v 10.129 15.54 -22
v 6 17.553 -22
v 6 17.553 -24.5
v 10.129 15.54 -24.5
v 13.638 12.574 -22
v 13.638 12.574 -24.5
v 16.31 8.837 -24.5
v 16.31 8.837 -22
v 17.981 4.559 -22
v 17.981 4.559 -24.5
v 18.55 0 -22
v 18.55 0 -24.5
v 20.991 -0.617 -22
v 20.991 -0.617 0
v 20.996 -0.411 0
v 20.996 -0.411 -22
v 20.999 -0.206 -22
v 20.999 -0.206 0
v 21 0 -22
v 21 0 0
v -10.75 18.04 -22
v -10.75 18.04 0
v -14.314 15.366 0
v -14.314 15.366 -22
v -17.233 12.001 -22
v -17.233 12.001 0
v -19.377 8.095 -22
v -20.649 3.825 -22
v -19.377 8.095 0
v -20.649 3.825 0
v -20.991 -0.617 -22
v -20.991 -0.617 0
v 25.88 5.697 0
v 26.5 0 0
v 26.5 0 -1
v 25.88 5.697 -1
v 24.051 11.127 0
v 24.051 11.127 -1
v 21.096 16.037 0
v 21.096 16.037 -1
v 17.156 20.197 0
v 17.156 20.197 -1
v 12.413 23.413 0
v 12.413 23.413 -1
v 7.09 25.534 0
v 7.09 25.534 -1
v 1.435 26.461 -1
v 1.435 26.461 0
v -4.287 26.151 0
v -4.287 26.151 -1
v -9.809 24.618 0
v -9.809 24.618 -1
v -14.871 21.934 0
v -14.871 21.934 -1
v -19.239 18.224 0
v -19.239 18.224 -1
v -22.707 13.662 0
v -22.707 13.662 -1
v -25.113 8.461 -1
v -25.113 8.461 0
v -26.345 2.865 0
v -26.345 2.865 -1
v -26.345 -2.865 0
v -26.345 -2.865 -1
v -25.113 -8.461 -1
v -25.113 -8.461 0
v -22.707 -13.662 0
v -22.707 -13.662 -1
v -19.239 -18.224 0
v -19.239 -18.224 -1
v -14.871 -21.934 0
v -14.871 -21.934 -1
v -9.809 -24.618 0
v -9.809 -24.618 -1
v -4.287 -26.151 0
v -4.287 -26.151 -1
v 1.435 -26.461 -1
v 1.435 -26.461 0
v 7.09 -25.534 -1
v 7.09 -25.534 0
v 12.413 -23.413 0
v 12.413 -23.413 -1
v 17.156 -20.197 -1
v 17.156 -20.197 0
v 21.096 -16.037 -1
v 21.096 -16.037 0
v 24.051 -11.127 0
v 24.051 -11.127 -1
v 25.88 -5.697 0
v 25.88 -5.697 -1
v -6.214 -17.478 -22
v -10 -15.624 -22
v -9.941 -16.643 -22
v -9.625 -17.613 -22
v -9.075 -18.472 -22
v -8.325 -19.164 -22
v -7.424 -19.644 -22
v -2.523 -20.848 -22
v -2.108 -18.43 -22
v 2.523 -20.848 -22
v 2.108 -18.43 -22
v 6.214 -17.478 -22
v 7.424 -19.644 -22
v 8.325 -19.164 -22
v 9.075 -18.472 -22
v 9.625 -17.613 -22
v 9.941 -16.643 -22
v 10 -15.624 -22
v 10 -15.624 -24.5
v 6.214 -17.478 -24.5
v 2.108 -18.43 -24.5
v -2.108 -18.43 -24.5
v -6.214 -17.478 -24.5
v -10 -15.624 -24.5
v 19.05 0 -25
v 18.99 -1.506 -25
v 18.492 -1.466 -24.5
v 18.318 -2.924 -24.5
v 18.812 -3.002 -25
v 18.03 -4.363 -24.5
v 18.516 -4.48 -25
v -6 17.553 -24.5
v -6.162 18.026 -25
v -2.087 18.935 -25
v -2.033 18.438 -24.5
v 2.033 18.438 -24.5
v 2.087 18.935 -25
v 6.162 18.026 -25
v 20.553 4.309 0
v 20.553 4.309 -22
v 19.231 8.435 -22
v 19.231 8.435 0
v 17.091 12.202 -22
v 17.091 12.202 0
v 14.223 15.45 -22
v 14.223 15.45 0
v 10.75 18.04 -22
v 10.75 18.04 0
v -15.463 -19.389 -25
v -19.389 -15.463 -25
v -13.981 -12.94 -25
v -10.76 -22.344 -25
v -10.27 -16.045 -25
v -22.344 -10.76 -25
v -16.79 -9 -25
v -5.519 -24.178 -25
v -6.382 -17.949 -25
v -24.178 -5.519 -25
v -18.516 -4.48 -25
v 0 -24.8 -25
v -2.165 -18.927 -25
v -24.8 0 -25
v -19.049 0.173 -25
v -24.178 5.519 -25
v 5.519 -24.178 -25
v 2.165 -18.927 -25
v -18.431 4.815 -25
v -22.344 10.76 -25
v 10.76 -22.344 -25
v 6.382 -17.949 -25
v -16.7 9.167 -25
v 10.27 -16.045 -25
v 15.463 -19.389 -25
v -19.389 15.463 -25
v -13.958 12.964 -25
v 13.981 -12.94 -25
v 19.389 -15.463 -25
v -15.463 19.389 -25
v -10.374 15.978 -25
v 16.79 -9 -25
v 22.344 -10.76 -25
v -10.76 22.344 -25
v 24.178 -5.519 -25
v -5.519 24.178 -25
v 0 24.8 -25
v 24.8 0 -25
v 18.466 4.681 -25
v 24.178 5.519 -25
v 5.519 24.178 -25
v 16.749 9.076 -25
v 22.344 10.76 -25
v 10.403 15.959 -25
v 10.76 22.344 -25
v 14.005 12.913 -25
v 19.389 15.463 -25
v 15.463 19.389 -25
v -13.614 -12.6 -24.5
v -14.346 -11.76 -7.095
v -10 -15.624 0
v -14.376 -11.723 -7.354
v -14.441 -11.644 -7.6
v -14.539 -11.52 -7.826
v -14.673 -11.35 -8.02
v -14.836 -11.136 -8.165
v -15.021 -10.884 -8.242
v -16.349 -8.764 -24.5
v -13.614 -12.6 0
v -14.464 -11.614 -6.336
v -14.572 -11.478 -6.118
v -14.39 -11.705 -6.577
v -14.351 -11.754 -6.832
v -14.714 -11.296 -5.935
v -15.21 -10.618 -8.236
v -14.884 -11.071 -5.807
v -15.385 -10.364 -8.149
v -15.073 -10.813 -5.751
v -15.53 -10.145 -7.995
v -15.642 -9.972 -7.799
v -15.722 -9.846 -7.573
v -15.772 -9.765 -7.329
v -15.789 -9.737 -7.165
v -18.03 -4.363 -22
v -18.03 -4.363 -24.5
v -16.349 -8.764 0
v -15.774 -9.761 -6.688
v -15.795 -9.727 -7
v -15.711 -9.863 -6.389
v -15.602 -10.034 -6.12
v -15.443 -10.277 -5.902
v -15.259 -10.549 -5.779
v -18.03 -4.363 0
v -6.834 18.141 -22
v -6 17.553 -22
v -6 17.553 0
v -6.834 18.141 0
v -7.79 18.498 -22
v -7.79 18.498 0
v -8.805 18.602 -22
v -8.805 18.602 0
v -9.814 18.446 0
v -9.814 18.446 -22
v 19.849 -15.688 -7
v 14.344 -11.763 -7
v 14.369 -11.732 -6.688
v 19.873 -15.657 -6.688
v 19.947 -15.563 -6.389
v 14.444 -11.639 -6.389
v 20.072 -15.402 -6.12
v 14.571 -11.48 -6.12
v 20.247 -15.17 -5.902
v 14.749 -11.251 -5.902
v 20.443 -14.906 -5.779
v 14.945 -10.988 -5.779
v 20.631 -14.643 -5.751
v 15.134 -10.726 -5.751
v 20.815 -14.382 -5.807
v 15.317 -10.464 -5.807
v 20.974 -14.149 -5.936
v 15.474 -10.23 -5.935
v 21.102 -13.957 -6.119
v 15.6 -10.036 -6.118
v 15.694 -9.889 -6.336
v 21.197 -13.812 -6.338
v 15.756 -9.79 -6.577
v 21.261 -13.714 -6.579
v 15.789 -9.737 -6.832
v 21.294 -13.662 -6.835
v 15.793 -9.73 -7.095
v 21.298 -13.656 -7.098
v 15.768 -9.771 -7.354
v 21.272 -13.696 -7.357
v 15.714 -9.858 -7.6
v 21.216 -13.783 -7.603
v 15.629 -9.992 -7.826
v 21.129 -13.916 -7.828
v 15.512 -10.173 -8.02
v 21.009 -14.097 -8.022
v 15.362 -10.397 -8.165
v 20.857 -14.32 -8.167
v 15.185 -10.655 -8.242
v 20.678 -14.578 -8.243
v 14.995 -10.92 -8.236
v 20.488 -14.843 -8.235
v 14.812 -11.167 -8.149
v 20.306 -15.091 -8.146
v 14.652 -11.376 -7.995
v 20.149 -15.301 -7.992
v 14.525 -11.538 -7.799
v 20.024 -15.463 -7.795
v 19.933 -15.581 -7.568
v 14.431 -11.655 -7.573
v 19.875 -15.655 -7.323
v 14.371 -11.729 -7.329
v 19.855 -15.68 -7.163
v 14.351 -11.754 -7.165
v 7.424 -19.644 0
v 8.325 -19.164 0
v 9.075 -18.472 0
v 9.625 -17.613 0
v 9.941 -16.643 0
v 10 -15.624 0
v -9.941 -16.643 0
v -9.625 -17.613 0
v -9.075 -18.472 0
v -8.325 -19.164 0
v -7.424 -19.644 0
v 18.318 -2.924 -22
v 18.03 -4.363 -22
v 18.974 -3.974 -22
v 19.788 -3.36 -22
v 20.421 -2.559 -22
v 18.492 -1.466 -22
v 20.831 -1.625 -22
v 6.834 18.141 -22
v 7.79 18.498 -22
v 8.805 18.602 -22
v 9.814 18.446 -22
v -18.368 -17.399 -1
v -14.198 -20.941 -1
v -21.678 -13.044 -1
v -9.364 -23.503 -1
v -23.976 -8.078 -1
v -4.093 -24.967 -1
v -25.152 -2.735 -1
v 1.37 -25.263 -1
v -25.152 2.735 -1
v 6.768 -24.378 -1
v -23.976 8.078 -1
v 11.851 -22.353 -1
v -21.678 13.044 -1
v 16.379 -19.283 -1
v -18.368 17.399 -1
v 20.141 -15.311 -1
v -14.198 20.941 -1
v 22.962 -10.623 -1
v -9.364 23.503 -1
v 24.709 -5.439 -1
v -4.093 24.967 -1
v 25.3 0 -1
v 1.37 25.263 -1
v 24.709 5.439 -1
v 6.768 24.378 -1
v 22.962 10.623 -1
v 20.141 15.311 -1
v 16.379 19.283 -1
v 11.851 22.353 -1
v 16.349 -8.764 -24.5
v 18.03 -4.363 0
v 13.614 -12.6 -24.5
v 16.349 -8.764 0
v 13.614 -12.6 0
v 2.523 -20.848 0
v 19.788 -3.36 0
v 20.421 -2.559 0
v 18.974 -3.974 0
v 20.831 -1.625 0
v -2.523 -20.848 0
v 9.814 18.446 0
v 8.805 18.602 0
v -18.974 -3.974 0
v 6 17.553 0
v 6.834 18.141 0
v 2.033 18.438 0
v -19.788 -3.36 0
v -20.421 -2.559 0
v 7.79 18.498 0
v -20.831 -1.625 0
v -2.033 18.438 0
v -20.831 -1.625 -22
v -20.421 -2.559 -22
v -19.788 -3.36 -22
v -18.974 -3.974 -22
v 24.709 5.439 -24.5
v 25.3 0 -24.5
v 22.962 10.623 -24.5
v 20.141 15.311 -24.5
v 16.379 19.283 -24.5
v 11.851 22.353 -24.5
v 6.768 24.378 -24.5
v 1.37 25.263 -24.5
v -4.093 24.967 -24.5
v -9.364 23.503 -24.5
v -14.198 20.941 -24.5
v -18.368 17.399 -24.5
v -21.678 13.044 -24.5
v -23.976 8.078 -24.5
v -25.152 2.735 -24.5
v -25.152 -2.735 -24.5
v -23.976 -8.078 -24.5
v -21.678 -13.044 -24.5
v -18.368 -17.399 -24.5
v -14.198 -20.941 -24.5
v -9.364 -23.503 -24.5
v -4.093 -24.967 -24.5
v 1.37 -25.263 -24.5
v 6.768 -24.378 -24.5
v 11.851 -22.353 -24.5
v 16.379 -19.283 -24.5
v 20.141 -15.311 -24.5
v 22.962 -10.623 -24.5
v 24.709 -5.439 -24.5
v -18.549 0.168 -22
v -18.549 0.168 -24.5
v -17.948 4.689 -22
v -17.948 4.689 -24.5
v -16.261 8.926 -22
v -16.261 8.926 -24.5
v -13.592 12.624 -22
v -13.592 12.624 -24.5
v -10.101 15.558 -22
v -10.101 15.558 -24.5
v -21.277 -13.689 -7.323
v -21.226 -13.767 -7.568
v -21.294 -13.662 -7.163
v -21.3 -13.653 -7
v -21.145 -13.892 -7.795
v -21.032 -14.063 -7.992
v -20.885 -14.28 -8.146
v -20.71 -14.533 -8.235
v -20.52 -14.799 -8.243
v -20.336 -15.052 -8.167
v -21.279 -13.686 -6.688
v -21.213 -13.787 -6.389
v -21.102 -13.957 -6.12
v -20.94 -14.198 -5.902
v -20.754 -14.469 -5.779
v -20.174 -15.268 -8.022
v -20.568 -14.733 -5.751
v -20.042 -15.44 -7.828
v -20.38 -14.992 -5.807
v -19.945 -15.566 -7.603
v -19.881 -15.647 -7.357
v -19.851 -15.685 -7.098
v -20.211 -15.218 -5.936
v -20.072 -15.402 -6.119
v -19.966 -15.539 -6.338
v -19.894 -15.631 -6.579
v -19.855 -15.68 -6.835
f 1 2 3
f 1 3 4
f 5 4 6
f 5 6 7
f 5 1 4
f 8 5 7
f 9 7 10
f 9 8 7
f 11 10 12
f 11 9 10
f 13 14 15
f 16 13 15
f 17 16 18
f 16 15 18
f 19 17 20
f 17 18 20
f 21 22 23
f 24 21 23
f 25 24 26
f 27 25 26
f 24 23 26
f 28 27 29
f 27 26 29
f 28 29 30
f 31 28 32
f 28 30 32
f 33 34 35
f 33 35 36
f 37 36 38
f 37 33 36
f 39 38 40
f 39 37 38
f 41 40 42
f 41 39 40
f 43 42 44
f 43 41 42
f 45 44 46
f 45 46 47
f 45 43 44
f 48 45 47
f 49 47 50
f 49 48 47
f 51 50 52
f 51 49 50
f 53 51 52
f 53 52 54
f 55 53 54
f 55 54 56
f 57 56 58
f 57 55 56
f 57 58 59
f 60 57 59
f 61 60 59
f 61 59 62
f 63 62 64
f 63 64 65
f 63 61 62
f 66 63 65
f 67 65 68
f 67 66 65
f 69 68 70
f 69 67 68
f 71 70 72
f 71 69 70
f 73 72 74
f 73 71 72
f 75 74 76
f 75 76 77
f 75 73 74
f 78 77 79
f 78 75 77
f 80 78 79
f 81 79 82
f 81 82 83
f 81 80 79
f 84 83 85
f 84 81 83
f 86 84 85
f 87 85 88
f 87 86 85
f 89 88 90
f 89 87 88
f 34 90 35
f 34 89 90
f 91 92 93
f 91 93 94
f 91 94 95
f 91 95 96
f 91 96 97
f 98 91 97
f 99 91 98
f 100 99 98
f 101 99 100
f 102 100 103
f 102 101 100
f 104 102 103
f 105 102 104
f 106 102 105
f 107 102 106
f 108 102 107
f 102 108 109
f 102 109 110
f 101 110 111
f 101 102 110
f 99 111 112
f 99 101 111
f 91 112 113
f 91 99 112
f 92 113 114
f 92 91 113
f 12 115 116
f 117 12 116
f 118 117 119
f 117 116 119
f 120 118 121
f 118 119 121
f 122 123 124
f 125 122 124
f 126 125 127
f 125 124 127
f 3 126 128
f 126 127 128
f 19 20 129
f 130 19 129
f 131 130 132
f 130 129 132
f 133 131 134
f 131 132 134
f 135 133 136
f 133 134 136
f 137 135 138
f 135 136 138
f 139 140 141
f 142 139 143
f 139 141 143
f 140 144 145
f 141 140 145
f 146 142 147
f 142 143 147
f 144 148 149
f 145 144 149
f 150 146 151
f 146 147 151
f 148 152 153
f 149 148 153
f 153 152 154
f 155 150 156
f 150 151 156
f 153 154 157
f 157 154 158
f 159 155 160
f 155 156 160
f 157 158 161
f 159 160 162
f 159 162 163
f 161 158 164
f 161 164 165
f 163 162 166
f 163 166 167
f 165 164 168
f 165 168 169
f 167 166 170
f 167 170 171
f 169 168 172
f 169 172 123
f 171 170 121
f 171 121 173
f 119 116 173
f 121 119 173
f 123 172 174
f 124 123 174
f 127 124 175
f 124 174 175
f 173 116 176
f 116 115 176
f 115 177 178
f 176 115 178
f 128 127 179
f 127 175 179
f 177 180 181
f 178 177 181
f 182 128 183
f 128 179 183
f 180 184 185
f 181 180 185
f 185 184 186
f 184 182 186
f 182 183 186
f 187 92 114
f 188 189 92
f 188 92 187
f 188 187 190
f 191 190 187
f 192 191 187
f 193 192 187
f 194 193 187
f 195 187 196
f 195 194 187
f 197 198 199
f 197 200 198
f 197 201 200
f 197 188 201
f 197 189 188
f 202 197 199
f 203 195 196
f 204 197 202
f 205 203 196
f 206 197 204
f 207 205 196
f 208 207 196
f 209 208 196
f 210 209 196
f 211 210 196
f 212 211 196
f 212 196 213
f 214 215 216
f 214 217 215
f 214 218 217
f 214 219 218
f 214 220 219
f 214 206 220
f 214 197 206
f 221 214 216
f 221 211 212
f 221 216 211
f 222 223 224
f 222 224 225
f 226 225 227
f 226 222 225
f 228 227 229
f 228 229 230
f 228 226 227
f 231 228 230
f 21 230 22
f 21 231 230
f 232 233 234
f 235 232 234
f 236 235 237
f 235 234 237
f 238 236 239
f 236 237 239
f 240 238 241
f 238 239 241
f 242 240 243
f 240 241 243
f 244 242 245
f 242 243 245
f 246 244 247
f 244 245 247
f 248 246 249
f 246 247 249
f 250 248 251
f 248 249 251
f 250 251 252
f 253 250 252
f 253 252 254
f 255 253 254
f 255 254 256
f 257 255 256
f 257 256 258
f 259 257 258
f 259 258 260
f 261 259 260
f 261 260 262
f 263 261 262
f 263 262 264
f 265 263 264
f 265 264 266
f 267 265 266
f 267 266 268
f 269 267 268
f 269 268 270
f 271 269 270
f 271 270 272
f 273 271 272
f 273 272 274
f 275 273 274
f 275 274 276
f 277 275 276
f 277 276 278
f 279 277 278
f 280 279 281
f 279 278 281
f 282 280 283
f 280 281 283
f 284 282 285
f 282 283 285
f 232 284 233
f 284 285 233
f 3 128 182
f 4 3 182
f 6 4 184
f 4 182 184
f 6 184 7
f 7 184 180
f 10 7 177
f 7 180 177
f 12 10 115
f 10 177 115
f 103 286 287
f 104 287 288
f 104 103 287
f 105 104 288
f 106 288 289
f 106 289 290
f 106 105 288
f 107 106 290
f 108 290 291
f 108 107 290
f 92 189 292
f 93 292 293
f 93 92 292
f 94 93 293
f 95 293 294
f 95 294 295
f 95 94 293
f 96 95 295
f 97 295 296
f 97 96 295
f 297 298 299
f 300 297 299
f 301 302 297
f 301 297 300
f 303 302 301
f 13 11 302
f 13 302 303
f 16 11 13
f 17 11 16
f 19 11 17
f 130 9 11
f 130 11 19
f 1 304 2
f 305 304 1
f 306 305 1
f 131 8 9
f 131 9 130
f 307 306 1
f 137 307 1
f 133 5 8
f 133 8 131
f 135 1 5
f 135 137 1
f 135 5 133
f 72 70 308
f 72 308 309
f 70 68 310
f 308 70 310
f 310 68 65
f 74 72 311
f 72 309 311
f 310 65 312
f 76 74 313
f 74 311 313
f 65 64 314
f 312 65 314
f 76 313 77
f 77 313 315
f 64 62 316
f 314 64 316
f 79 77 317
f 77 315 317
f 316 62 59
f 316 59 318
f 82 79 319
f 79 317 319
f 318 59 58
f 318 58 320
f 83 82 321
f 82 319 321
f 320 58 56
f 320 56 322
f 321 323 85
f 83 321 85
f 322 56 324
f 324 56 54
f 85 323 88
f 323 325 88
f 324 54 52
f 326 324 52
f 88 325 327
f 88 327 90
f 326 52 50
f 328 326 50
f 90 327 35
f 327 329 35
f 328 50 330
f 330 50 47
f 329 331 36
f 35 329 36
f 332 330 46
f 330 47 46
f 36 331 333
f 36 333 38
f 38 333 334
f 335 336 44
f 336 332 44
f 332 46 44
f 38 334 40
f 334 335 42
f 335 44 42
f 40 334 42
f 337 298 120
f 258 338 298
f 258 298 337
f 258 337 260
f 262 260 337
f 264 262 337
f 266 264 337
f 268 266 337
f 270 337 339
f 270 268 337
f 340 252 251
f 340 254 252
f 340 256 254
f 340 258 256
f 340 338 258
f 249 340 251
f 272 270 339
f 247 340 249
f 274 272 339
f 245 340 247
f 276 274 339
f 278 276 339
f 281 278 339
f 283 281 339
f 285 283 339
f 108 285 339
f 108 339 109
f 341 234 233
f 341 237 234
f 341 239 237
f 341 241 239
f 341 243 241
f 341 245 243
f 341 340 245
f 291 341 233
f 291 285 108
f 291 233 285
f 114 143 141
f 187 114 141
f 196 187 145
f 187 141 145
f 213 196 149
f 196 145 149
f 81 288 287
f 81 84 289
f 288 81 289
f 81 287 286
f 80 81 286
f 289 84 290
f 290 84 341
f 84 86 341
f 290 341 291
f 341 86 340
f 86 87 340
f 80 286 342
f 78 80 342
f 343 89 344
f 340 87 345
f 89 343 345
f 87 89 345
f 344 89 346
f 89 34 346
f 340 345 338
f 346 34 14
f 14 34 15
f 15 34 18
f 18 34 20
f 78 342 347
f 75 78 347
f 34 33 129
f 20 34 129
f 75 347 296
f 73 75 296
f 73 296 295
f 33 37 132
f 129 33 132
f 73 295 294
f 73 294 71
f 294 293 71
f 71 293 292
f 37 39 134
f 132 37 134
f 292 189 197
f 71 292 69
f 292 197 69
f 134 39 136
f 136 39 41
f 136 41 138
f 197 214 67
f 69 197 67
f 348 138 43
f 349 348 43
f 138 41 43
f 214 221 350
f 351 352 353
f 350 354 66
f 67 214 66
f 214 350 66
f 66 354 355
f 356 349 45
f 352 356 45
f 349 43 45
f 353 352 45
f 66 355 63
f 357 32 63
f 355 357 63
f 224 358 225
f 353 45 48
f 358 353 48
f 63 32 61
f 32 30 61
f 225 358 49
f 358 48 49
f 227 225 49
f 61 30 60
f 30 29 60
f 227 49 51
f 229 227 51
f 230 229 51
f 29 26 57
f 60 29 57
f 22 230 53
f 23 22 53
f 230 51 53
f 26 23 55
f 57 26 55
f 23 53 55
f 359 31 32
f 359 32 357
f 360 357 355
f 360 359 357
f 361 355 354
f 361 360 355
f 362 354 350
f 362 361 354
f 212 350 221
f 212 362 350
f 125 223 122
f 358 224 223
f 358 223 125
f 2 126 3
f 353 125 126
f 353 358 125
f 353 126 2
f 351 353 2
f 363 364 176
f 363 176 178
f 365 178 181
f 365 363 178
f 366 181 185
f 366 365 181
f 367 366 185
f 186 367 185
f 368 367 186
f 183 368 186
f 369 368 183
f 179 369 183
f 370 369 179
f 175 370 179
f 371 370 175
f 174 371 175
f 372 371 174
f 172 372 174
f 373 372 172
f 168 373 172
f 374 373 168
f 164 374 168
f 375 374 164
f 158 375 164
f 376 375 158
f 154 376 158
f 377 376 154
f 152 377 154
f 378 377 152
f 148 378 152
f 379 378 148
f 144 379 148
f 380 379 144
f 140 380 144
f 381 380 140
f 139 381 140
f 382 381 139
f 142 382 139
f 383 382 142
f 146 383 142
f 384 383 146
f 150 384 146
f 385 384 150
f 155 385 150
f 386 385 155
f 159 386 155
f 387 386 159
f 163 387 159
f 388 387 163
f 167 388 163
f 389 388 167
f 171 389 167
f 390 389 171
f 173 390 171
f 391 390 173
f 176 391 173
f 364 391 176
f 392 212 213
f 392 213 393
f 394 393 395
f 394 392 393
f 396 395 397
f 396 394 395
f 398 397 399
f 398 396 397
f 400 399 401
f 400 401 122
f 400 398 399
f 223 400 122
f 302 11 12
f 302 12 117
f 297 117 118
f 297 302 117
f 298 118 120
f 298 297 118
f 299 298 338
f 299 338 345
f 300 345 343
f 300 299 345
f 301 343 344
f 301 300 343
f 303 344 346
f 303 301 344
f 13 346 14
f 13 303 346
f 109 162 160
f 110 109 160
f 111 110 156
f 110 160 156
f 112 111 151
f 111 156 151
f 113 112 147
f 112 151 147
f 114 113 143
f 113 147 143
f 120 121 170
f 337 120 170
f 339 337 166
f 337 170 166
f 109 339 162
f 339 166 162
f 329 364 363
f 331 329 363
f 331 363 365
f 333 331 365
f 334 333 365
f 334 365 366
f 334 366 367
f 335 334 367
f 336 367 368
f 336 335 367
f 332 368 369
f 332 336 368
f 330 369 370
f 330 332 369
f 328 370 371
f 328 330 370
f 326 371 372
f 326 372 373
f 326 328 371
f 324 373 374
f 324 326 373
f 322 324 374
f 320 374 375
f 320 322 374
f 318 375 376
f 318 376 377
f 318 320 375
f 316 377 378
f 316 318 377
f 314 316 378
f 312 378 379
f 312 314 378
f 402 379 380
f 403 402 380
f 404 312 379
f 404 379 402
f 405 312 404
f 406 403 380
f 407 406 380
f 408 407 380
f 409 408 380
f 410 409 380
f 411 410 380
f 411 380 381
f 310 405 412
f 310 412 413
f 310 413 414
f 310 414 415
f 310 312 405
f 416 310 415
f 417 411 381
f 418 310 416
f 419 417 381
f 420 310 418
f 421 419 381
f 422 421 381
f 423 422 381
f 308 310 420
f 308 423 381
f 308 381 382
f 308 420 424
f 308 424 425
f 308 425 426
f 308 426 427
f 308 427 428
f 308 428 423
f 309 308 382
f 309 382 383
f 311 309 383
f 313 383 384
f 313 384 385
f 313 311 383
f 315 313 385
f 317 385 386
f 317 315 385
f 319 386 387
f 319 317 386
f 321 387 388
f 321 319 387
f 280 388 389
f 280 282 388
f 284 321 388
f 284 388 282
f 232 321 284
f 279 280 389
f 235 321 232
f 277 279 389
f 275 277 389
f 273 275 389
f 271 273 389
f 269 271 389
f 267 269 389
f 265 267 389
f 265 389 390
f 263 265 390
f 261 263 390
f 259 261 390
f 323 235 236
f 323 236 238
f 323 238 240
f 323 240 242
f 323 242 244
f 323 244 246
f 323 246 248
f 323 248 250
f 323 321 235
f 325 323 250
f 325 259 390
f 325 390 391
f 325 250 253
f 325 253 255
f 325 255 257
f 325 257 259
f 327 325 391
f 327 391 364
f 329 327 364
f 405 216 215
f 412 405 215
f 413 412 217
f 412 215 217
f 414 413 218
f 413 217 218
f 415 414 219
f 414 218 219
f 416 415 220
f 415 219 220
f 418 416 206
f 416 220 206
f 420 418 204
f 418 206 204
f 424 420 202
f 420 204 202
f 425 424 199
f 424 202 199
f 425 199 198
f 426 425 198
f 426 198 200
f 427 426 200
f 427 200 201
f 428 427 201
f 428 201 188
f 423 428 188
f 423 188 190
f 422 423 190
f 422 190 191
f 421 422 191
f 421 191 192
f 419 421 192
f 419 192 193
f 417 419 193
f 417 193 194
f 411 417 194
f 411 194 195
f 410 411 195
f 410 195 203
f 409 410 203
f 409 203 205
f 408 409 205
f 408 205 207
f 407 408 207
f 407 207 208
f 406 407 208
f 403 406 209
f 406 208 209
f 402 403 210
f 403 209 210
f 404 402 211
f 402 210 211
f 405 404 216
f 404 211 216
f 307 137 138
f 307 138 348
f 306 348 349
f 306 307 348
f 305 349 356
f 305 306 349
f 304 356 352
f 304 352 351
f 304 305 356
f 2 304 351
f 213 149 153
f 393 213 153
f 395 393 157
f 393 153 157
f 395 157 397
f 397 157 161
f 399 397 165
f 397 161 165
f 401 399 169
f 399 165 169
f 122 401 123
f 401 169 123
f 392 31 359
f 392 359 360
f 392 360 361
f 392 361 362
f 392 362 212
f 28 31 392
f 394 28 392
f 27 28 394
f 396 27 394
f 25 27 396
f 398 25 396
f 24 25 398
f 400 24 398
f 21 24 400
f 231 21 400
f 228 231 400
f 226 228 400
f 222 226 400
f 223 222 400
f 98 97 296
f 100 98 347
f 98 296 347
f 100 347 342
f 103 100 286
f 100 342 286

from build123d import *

# Parameters (mm, degrees)
F0_R           = 26.5
F0_R_2         = 25.3
F1_DEPTH       = 1
F2_DEPTH       = 25
F3_DEPTH       = 22
F4_T1_DEPTH    = 22
F9_D           = 2.5
F9_DEPTH       = 25
F9_START       = 1.2308984
F9_TIP         = 0.7510757738
F9_ON_F7_D     = 2.5
F9_ON_F7_DEPTH = 25
F9_ON_F7_START = 1.2308984
F9_ON_F7_TIP   = 0.7510757738
F10_SIZE       = 0.5


# Not quite as in the source:
# - a fillet or chamfer that OpenCascade refuses, or shapes differently, is made with other operations: its cross-section is extruded or revolved along the edge and cut away or added


with BuildPart() as f1:
    # F0 (on Top) → F1 (new body)
    with BuildSketch(Plane.XY):
        Circle(F0_R)
        Circle(F0_R_2, mode=Mode.SUBTRACT)
        Circle(F0_R_2)
        with BuildLine():
            ThreePointArc((-6.7924528302, 19.8711495528), (0, 21), (6.7924528302, 19.8711495528))
            ThreePointArc((6.7924528302, 19.8711495528), (17.0827619171, 12.2138955818), (21, 0))
            ThreePointArc((21, 0), (20.8522276614, -2.4868859159), (20.4109903277, -4.9387725035))
            ThreePointArc((20.4109903277, -4.9387725035), (17.0984542242, -12.1919179436), (11.320754717, -17.6872980593))
            ThreePointArc((11.320754717, -17.6872980593), (0, -21), (-11.320754717, -17.6872980593))
            ThreePointArc((-11.320754717, -17.6872980593), (-17.0984542242, -12.1919179436), (-20.4109903277, -4.9387725035))
            ThreePointArc((-20.4109903277, -4.9387725035), (-18.4089621658, 10.1049548232), (-6.7924528302, 19.8711495528))
        make_face(mode=Mode.SUBTRACT)
    extrude(amount=-F1_DEPTH)

    # F0 (on Top) → F2 (join)
    with BuildSketch(Plane.XY):
        Circle(F0_R_2)
        with BuildLine():
            ThreePointArc((-6.7924528302, 19.8711495528), (0, 21), (6.7924528302, 19.8711495528))
            ThreePointArc((6.7924528302, 19.8711495528), (17.0827619171, 12.2138955818), (21, 0))
            ThreePointArc((21, 0), (20.8522276614, -2.4868859159), (20.4109903277, -4.9387725035))
            ThreePointArc((20.4109903277, -4.9387725035), (17.0984542242, -12.1919179436), (11.320754717, -17.6872980593))
            ThreePointArc((11.320754717, -17.6872980593), (0, -21), (-11.320754717, -17.6872980593))
            ThreePointArc((-11.320754717, -17.6872980593), (-17.0984542242, -12.1919179436), (-20.4109903277, -4.9387725035))
            ThreePointArc((-20.4109903277, -4.9387725035), (-18.4089621658, 10.1049548232), (-6.7924528302, 19.8711495528))
        make_face(mode=Mode.SUBTRACT)
        with BuildLine():
            Line((20.4109903277, -4.9387725035), (18.0297081228, -4.3625823781))
            ThreePointArc((18.0297081228, -4.3625823781), (15.1036345647, -10.7695275168), (10, -15.6237799524))
            Line((10, -15.6237799524), (11.320754717, -17.6872980593))
            ThreePointArc((11.320754717, -17.6872980593), (17.0984542242, -12.1919179436), (20.4109903277, -4.9387725035))
        make_face()
        with BuildLine():
            ThreePointArc((6, 17.5528487716), (15.0897730268, 10.7889410973), (18.55, 0))
            ThreePointArc((18.55, 0), (18.4194677675, -2.1967492257), (18.0297081228, -4.3625823781))
            Line((18.0297081228, -4.3625823781), (20.4109903277, -4.9387725035))
            ThreePointArc((20.4109903277, -4.9387725035), (20.8522276614, -2.4868859159), (21, 0))
            ThreePointArc((21, 0), (17.0827619171, 12.2138955818), (6.7924528302, 19.8711495528))
            Line((6.7924528302, 19.8711495528), (6, 17.5528487716))
        make_face()
        with BuildLine():
            ThreePointArc((-6, 17.5528487716), (0, 18.55), (6, 17.5528487716))
            Line((6, 17.5528487716), (6.7924528302, 19.8711495528))
            ThreePointArc((6.7924528302, 19.8711495528), (0, 21), (-6.7924528302, 19.8711495528))
            Line((-6.7924528302, 19.8711495528), (-6, 17.5528487716))
        make_face()
        with BuildLine():
            ThreePointArc((-18.0297081228, -4.3625823781), (-16.2612499131, 8.9260434271), (-6, 17.5528487716))
            Line((-6, 17.5528487716), (-6.7924528302, 19.8711495528))
            ThreePointArc((-6.7924528302, 19.8711495528), (-18.4089621658, 10.1049548232), (-20.4109903277, -4.9387725035))
            Line((-20.4109903277, -4.9387725035), (-18.0297081228, -4.3625823781))
        make_face()
        with BuildLine():
            ThreePointArc((-10, -15.6237799524), (-15.1036345647, -10.7695275168), (-18.0297081228, -4.3625823781))
            Line((-18.0297081228, -4.3625823781), (-20.4109903277, -4.9387725035))
            ThreePointArc((-20.4109903277, -4.9387725035), (-17.0984542242, -12.1919179436), (-11.320754717, -17.6872980593))
            Line((-11.320754717, -17.6872980593), (-10, -15.6237799524))
        make_face()
        with BuildLine():
            Line((11.320754717, -17.6872980593), (10, -15.6237799524))
            ThreePointArc((10, -15.6237799524), (0, -18.55), (-10, -15.6237799524))
            Line((-10, -15.6237799524), (-11.320754717, -17.6872980593))
            ThreePointArc((-11.320754717, -17.6872980593), (0, -21), (11.320754717, -17.6872980593))
        make_face()
    extrude(amount=-F2_DEPTH)

    # F0 (on Top) → F3 (cut)
    with BuildSketch(Plane.XY):
        with BuildLine():
            ThreePointArc((6, 17.5528487716), (15.0897730268, 10.7889410973), (18.55, 0))
            ThreePointArc((18.55, 0), (18.4194677675, -2.1967492257), (18.0297081228, -4.3625823781))
            Line((18.0297081228, -4.3625823781), (20.4109903277, -4.9387725035))
            ThreePointArc((20.4109903277, -4.9387725035), (20.8522276614, -2.4868859159), (21, 0))
            ThreePointArc((21, 0), (17.0827619171, 12.2138955818), (6.7924528302, 19.8711495528))
            Line((6.7924528302, 19.8711495528), (6, 17.5528487716))
        make_face()
        with BuildLine():
            Line((11.320754717, -17.6872980593), (10, -15.6237799524))
            ThreePointArc((10, -15.6237799524), (0, -18.55), (-10, -15.6237799524))
            Line((-10, -15.6237799524), (-11.320754717, -17.6872980593))
            ThreePointArc((-11.320754717, -17.6872980593), (0, -21), (11.320754717, -17.6872980593))
        make_face()
        with BuildLine():
            ThreePointArc((-18.0297081228, -4.3625823781), (-16.2612499131, 8.9260434271), (-6, 17.5528487716))
            Line((-6, 17.5528487716), (-6.7924528302, 19.8711495528))
            ThreePointArc((-6.7924528302, 19.8711495528), (-18.4089621658, 10.1049548232), (-20.4109903277, -4.9387725035))
            Line((-20.4109903277, -4.9387725035), (-18.0297081228, -4.3625823781))
        make_face()
    extrude(amount=-F3_DEPTH, mode=Mode.SUBTRACT)

    # F4: fillet of radius 4 on 6 edges, made by hand

    # F4_s2 → F4_t1 (join)
    with BuildSketch(Plane.XY.offset(-22)):
        with BuildLine():
            ThreePointArc((10.7499670552, 18.0399059951), (8.2943373762, 18.582869286), (6, 17.5528487716))
            Line((6, 17.5528487716), (5.9459529143, 17.6118310786))
            ThreePointArc((5.9459529143, 17.6118310786), (6.3205267978, 18.737875173), (6.7167532128, 19.8970255636))
            Line((6.7167532128, 19.8970255636), (6.818328841, 19.9468491701))
            ThreePointArc((6.818328841, 19.9468491701), (8.852466778, 19.1311325317), (10.7909193107, 18.1086294465))
            Line((10.7909193107, 18.1086294465), (10.7499670552, 18.0399059951))
        make_face()
        with BuildLine():
            ThreePointArc((-6, 17.5528487716), (-8.2943373762, 18.582869286), (-10.7499670552, 18.0399059951))
            Line((-10.7499670552, 18.0399059951), (-10.7909193107, 18.1086294465))
            ThreePointArc((-10.7909193107, 18.1086294465), (-8.852466778, 19.1311325317), (-6.818328841, 19.9468491701))
            Line((-6.818328841, 19.9468491701), (-6.7167532128, 19.8970255636))
            ThreePointArc((-6.7167532128, 19.8970255636), (-6.3205267978, 18.737875173), (-5.9459529143, 17.6118310786))
            Line((-5.9459529143, 17.6118310786), (-6, 17.5528487716))
        make_face()
        with BuildLine():
            ThreePointArc((18.0297081228, -4.3625823781), (20.1305359874, -2.9800309182), (20.9909384883, -0.6168479392))
            Line((20.9909384883, -0.6168479392), (21.0709039683, -0.6191978361))
            ThreePointArc((21.0709039683, -0.6191978361), (20.8927389597, -2.8035439649), (20.4887464814, -4.957586875))
            Line((20.4887464814, -4.957586875), (20.3921759563, -5.0165286572))
            ThreePointArc((20.3921759563, -5.0165286572), (19.2015348538, -4.7284335945), (18.0504489955, -4.4398469638))
            Line((18.0504489955, -4.4398469638), (18.0297081228, -4.3625823781))
        make_face()
        with BuildLine():
            ThreePointArc((7.423758192, -19.6440274462), (9.3775452078, -18.0604736729), (10, -15.6237799524))
            Line((10, -15.6237799524), (10.0798058197, -15.6182093928))
            ThreePointArc((10.0798058197, -15.6182093928), (10.7277575416, -16.6124123212), (11.3881349001, -17.6441713746))
            Line((11.3881349001, -17.6441713746), (11.3638814016, -17.7546782424))
            ThreePointArc((11.3638814016, -17.7546782424), (9.4590814084, -18.8385821895), (7.4520391756, -19.7188618365))
            Line((7.4520391756, -19.7188618365), (7.423758192, -19.6440274462))
        make_face()
        with BuildLine():
            ThreePointArc((-10, -15.6237799524), (-9.3775452078, -18.0604736729), (-7.423758192, -19.6440274462))
            Line((-7.423758192, -19.6440274462), (-7.4520391756, -19.7188618365))
            ThreePointArc((-7.4520391756, -19.7188618365), (-9.4590814084, -18.8385821895), (-11.3638814016, -17.7546782424))
            Line((-11.3638814016, -17.7546782424), (-11.3881349001, -17.6441713746))
            ThreePointArc((-11.3881349001, -17.6441713746), (-10.7277575416, -16.6124123212), (-10.0798058197, -15.6182093928))
            Line((-10.0798058197, -15.6182093928), (-10, -15.6237799524))
        make_face()
        with BuildLine():
            ThreePointArc((-20.9909384883, -0.6168479392), (-20.1305359874, -2.9800309182), (-18.0297081228, -4.3625823781))
            Line((-18.0297081228, -4.3625823781), (-18.0504489955, -4.4398469638))
            ThreePointArc((-18.0504489955, -4.4398469638), (-19.2015348538, -4.7284335945), (-20.3921759563, -5.0165286572))
            Line((-20.3921759563, -5.0165286572), (-20.4887464814, -4.957586875))
            ThreePointArc((-20.4887464814, -4.957586875), (-20.8927389597, -2.8035439649), (-21.0709039683, -0.6191978361))
            Line((-21.0709039683, -0.6191978361), (-20.9909384883, -0.6168479392))
        make_face()
    extrude(amount=F4_T1_DEPTH)

    # F9
    # its depths count from where the whole tool has entered the part; down to there all is cleared
    with Locations(Plane(origin=(-21.5766208067, -15.3850393098, 0), x_dir=(0.5805675211, -0.8142121059, 0), z_dir=(-0.8142121059, -0.5805675211, 0)).offset(-F9_START)):
        with Locations((0, -7)):
            Hole(F9_D / 2, depth=F9_DEPTH)
            with Locations((0, 0, -(F9_DEPTH + F9_TIP / 2))):  # 118° drill point
                Cone(0, F9_D / 2, F9_TIP, mode=Mode.SUBTRACT)

    # F9 on F7
    # its depths count from where the whole tool has entered the part; down to there all is cleared
    with Locations(Plane(origin=(21.5766208067, -15.3850393098, 0), x_dir=(0.5805675211, 0.8142121059, 0), z_dir=(0.8142121059, -0.5805675211, 0)).offset(-F9_ON_F7_START)):
        with Locations((0, -7)):
            Hole(F9_ON_F7_D / 2, depth=F9_ON_F7_DEPTH)
            with Locations((0, 0, -(F9_ON_F7_DEPTH + F9_ON_F7_TIP / 2))):  # 118° drill point
                Cone(0, F9_ON_F7_D / 2, F9_ON_F7_TIP, mode=Mode.SUBTRACT)

    # F10
    f10_edges = [f1.edges().sort_by_distance(p)[0] for p in [
        (-10, 15.62378, -25),
        (-25.3, 0, -25),
    ]]
    chamfer(f10_edges, length=F10_SIZE)


solid = f1.part
